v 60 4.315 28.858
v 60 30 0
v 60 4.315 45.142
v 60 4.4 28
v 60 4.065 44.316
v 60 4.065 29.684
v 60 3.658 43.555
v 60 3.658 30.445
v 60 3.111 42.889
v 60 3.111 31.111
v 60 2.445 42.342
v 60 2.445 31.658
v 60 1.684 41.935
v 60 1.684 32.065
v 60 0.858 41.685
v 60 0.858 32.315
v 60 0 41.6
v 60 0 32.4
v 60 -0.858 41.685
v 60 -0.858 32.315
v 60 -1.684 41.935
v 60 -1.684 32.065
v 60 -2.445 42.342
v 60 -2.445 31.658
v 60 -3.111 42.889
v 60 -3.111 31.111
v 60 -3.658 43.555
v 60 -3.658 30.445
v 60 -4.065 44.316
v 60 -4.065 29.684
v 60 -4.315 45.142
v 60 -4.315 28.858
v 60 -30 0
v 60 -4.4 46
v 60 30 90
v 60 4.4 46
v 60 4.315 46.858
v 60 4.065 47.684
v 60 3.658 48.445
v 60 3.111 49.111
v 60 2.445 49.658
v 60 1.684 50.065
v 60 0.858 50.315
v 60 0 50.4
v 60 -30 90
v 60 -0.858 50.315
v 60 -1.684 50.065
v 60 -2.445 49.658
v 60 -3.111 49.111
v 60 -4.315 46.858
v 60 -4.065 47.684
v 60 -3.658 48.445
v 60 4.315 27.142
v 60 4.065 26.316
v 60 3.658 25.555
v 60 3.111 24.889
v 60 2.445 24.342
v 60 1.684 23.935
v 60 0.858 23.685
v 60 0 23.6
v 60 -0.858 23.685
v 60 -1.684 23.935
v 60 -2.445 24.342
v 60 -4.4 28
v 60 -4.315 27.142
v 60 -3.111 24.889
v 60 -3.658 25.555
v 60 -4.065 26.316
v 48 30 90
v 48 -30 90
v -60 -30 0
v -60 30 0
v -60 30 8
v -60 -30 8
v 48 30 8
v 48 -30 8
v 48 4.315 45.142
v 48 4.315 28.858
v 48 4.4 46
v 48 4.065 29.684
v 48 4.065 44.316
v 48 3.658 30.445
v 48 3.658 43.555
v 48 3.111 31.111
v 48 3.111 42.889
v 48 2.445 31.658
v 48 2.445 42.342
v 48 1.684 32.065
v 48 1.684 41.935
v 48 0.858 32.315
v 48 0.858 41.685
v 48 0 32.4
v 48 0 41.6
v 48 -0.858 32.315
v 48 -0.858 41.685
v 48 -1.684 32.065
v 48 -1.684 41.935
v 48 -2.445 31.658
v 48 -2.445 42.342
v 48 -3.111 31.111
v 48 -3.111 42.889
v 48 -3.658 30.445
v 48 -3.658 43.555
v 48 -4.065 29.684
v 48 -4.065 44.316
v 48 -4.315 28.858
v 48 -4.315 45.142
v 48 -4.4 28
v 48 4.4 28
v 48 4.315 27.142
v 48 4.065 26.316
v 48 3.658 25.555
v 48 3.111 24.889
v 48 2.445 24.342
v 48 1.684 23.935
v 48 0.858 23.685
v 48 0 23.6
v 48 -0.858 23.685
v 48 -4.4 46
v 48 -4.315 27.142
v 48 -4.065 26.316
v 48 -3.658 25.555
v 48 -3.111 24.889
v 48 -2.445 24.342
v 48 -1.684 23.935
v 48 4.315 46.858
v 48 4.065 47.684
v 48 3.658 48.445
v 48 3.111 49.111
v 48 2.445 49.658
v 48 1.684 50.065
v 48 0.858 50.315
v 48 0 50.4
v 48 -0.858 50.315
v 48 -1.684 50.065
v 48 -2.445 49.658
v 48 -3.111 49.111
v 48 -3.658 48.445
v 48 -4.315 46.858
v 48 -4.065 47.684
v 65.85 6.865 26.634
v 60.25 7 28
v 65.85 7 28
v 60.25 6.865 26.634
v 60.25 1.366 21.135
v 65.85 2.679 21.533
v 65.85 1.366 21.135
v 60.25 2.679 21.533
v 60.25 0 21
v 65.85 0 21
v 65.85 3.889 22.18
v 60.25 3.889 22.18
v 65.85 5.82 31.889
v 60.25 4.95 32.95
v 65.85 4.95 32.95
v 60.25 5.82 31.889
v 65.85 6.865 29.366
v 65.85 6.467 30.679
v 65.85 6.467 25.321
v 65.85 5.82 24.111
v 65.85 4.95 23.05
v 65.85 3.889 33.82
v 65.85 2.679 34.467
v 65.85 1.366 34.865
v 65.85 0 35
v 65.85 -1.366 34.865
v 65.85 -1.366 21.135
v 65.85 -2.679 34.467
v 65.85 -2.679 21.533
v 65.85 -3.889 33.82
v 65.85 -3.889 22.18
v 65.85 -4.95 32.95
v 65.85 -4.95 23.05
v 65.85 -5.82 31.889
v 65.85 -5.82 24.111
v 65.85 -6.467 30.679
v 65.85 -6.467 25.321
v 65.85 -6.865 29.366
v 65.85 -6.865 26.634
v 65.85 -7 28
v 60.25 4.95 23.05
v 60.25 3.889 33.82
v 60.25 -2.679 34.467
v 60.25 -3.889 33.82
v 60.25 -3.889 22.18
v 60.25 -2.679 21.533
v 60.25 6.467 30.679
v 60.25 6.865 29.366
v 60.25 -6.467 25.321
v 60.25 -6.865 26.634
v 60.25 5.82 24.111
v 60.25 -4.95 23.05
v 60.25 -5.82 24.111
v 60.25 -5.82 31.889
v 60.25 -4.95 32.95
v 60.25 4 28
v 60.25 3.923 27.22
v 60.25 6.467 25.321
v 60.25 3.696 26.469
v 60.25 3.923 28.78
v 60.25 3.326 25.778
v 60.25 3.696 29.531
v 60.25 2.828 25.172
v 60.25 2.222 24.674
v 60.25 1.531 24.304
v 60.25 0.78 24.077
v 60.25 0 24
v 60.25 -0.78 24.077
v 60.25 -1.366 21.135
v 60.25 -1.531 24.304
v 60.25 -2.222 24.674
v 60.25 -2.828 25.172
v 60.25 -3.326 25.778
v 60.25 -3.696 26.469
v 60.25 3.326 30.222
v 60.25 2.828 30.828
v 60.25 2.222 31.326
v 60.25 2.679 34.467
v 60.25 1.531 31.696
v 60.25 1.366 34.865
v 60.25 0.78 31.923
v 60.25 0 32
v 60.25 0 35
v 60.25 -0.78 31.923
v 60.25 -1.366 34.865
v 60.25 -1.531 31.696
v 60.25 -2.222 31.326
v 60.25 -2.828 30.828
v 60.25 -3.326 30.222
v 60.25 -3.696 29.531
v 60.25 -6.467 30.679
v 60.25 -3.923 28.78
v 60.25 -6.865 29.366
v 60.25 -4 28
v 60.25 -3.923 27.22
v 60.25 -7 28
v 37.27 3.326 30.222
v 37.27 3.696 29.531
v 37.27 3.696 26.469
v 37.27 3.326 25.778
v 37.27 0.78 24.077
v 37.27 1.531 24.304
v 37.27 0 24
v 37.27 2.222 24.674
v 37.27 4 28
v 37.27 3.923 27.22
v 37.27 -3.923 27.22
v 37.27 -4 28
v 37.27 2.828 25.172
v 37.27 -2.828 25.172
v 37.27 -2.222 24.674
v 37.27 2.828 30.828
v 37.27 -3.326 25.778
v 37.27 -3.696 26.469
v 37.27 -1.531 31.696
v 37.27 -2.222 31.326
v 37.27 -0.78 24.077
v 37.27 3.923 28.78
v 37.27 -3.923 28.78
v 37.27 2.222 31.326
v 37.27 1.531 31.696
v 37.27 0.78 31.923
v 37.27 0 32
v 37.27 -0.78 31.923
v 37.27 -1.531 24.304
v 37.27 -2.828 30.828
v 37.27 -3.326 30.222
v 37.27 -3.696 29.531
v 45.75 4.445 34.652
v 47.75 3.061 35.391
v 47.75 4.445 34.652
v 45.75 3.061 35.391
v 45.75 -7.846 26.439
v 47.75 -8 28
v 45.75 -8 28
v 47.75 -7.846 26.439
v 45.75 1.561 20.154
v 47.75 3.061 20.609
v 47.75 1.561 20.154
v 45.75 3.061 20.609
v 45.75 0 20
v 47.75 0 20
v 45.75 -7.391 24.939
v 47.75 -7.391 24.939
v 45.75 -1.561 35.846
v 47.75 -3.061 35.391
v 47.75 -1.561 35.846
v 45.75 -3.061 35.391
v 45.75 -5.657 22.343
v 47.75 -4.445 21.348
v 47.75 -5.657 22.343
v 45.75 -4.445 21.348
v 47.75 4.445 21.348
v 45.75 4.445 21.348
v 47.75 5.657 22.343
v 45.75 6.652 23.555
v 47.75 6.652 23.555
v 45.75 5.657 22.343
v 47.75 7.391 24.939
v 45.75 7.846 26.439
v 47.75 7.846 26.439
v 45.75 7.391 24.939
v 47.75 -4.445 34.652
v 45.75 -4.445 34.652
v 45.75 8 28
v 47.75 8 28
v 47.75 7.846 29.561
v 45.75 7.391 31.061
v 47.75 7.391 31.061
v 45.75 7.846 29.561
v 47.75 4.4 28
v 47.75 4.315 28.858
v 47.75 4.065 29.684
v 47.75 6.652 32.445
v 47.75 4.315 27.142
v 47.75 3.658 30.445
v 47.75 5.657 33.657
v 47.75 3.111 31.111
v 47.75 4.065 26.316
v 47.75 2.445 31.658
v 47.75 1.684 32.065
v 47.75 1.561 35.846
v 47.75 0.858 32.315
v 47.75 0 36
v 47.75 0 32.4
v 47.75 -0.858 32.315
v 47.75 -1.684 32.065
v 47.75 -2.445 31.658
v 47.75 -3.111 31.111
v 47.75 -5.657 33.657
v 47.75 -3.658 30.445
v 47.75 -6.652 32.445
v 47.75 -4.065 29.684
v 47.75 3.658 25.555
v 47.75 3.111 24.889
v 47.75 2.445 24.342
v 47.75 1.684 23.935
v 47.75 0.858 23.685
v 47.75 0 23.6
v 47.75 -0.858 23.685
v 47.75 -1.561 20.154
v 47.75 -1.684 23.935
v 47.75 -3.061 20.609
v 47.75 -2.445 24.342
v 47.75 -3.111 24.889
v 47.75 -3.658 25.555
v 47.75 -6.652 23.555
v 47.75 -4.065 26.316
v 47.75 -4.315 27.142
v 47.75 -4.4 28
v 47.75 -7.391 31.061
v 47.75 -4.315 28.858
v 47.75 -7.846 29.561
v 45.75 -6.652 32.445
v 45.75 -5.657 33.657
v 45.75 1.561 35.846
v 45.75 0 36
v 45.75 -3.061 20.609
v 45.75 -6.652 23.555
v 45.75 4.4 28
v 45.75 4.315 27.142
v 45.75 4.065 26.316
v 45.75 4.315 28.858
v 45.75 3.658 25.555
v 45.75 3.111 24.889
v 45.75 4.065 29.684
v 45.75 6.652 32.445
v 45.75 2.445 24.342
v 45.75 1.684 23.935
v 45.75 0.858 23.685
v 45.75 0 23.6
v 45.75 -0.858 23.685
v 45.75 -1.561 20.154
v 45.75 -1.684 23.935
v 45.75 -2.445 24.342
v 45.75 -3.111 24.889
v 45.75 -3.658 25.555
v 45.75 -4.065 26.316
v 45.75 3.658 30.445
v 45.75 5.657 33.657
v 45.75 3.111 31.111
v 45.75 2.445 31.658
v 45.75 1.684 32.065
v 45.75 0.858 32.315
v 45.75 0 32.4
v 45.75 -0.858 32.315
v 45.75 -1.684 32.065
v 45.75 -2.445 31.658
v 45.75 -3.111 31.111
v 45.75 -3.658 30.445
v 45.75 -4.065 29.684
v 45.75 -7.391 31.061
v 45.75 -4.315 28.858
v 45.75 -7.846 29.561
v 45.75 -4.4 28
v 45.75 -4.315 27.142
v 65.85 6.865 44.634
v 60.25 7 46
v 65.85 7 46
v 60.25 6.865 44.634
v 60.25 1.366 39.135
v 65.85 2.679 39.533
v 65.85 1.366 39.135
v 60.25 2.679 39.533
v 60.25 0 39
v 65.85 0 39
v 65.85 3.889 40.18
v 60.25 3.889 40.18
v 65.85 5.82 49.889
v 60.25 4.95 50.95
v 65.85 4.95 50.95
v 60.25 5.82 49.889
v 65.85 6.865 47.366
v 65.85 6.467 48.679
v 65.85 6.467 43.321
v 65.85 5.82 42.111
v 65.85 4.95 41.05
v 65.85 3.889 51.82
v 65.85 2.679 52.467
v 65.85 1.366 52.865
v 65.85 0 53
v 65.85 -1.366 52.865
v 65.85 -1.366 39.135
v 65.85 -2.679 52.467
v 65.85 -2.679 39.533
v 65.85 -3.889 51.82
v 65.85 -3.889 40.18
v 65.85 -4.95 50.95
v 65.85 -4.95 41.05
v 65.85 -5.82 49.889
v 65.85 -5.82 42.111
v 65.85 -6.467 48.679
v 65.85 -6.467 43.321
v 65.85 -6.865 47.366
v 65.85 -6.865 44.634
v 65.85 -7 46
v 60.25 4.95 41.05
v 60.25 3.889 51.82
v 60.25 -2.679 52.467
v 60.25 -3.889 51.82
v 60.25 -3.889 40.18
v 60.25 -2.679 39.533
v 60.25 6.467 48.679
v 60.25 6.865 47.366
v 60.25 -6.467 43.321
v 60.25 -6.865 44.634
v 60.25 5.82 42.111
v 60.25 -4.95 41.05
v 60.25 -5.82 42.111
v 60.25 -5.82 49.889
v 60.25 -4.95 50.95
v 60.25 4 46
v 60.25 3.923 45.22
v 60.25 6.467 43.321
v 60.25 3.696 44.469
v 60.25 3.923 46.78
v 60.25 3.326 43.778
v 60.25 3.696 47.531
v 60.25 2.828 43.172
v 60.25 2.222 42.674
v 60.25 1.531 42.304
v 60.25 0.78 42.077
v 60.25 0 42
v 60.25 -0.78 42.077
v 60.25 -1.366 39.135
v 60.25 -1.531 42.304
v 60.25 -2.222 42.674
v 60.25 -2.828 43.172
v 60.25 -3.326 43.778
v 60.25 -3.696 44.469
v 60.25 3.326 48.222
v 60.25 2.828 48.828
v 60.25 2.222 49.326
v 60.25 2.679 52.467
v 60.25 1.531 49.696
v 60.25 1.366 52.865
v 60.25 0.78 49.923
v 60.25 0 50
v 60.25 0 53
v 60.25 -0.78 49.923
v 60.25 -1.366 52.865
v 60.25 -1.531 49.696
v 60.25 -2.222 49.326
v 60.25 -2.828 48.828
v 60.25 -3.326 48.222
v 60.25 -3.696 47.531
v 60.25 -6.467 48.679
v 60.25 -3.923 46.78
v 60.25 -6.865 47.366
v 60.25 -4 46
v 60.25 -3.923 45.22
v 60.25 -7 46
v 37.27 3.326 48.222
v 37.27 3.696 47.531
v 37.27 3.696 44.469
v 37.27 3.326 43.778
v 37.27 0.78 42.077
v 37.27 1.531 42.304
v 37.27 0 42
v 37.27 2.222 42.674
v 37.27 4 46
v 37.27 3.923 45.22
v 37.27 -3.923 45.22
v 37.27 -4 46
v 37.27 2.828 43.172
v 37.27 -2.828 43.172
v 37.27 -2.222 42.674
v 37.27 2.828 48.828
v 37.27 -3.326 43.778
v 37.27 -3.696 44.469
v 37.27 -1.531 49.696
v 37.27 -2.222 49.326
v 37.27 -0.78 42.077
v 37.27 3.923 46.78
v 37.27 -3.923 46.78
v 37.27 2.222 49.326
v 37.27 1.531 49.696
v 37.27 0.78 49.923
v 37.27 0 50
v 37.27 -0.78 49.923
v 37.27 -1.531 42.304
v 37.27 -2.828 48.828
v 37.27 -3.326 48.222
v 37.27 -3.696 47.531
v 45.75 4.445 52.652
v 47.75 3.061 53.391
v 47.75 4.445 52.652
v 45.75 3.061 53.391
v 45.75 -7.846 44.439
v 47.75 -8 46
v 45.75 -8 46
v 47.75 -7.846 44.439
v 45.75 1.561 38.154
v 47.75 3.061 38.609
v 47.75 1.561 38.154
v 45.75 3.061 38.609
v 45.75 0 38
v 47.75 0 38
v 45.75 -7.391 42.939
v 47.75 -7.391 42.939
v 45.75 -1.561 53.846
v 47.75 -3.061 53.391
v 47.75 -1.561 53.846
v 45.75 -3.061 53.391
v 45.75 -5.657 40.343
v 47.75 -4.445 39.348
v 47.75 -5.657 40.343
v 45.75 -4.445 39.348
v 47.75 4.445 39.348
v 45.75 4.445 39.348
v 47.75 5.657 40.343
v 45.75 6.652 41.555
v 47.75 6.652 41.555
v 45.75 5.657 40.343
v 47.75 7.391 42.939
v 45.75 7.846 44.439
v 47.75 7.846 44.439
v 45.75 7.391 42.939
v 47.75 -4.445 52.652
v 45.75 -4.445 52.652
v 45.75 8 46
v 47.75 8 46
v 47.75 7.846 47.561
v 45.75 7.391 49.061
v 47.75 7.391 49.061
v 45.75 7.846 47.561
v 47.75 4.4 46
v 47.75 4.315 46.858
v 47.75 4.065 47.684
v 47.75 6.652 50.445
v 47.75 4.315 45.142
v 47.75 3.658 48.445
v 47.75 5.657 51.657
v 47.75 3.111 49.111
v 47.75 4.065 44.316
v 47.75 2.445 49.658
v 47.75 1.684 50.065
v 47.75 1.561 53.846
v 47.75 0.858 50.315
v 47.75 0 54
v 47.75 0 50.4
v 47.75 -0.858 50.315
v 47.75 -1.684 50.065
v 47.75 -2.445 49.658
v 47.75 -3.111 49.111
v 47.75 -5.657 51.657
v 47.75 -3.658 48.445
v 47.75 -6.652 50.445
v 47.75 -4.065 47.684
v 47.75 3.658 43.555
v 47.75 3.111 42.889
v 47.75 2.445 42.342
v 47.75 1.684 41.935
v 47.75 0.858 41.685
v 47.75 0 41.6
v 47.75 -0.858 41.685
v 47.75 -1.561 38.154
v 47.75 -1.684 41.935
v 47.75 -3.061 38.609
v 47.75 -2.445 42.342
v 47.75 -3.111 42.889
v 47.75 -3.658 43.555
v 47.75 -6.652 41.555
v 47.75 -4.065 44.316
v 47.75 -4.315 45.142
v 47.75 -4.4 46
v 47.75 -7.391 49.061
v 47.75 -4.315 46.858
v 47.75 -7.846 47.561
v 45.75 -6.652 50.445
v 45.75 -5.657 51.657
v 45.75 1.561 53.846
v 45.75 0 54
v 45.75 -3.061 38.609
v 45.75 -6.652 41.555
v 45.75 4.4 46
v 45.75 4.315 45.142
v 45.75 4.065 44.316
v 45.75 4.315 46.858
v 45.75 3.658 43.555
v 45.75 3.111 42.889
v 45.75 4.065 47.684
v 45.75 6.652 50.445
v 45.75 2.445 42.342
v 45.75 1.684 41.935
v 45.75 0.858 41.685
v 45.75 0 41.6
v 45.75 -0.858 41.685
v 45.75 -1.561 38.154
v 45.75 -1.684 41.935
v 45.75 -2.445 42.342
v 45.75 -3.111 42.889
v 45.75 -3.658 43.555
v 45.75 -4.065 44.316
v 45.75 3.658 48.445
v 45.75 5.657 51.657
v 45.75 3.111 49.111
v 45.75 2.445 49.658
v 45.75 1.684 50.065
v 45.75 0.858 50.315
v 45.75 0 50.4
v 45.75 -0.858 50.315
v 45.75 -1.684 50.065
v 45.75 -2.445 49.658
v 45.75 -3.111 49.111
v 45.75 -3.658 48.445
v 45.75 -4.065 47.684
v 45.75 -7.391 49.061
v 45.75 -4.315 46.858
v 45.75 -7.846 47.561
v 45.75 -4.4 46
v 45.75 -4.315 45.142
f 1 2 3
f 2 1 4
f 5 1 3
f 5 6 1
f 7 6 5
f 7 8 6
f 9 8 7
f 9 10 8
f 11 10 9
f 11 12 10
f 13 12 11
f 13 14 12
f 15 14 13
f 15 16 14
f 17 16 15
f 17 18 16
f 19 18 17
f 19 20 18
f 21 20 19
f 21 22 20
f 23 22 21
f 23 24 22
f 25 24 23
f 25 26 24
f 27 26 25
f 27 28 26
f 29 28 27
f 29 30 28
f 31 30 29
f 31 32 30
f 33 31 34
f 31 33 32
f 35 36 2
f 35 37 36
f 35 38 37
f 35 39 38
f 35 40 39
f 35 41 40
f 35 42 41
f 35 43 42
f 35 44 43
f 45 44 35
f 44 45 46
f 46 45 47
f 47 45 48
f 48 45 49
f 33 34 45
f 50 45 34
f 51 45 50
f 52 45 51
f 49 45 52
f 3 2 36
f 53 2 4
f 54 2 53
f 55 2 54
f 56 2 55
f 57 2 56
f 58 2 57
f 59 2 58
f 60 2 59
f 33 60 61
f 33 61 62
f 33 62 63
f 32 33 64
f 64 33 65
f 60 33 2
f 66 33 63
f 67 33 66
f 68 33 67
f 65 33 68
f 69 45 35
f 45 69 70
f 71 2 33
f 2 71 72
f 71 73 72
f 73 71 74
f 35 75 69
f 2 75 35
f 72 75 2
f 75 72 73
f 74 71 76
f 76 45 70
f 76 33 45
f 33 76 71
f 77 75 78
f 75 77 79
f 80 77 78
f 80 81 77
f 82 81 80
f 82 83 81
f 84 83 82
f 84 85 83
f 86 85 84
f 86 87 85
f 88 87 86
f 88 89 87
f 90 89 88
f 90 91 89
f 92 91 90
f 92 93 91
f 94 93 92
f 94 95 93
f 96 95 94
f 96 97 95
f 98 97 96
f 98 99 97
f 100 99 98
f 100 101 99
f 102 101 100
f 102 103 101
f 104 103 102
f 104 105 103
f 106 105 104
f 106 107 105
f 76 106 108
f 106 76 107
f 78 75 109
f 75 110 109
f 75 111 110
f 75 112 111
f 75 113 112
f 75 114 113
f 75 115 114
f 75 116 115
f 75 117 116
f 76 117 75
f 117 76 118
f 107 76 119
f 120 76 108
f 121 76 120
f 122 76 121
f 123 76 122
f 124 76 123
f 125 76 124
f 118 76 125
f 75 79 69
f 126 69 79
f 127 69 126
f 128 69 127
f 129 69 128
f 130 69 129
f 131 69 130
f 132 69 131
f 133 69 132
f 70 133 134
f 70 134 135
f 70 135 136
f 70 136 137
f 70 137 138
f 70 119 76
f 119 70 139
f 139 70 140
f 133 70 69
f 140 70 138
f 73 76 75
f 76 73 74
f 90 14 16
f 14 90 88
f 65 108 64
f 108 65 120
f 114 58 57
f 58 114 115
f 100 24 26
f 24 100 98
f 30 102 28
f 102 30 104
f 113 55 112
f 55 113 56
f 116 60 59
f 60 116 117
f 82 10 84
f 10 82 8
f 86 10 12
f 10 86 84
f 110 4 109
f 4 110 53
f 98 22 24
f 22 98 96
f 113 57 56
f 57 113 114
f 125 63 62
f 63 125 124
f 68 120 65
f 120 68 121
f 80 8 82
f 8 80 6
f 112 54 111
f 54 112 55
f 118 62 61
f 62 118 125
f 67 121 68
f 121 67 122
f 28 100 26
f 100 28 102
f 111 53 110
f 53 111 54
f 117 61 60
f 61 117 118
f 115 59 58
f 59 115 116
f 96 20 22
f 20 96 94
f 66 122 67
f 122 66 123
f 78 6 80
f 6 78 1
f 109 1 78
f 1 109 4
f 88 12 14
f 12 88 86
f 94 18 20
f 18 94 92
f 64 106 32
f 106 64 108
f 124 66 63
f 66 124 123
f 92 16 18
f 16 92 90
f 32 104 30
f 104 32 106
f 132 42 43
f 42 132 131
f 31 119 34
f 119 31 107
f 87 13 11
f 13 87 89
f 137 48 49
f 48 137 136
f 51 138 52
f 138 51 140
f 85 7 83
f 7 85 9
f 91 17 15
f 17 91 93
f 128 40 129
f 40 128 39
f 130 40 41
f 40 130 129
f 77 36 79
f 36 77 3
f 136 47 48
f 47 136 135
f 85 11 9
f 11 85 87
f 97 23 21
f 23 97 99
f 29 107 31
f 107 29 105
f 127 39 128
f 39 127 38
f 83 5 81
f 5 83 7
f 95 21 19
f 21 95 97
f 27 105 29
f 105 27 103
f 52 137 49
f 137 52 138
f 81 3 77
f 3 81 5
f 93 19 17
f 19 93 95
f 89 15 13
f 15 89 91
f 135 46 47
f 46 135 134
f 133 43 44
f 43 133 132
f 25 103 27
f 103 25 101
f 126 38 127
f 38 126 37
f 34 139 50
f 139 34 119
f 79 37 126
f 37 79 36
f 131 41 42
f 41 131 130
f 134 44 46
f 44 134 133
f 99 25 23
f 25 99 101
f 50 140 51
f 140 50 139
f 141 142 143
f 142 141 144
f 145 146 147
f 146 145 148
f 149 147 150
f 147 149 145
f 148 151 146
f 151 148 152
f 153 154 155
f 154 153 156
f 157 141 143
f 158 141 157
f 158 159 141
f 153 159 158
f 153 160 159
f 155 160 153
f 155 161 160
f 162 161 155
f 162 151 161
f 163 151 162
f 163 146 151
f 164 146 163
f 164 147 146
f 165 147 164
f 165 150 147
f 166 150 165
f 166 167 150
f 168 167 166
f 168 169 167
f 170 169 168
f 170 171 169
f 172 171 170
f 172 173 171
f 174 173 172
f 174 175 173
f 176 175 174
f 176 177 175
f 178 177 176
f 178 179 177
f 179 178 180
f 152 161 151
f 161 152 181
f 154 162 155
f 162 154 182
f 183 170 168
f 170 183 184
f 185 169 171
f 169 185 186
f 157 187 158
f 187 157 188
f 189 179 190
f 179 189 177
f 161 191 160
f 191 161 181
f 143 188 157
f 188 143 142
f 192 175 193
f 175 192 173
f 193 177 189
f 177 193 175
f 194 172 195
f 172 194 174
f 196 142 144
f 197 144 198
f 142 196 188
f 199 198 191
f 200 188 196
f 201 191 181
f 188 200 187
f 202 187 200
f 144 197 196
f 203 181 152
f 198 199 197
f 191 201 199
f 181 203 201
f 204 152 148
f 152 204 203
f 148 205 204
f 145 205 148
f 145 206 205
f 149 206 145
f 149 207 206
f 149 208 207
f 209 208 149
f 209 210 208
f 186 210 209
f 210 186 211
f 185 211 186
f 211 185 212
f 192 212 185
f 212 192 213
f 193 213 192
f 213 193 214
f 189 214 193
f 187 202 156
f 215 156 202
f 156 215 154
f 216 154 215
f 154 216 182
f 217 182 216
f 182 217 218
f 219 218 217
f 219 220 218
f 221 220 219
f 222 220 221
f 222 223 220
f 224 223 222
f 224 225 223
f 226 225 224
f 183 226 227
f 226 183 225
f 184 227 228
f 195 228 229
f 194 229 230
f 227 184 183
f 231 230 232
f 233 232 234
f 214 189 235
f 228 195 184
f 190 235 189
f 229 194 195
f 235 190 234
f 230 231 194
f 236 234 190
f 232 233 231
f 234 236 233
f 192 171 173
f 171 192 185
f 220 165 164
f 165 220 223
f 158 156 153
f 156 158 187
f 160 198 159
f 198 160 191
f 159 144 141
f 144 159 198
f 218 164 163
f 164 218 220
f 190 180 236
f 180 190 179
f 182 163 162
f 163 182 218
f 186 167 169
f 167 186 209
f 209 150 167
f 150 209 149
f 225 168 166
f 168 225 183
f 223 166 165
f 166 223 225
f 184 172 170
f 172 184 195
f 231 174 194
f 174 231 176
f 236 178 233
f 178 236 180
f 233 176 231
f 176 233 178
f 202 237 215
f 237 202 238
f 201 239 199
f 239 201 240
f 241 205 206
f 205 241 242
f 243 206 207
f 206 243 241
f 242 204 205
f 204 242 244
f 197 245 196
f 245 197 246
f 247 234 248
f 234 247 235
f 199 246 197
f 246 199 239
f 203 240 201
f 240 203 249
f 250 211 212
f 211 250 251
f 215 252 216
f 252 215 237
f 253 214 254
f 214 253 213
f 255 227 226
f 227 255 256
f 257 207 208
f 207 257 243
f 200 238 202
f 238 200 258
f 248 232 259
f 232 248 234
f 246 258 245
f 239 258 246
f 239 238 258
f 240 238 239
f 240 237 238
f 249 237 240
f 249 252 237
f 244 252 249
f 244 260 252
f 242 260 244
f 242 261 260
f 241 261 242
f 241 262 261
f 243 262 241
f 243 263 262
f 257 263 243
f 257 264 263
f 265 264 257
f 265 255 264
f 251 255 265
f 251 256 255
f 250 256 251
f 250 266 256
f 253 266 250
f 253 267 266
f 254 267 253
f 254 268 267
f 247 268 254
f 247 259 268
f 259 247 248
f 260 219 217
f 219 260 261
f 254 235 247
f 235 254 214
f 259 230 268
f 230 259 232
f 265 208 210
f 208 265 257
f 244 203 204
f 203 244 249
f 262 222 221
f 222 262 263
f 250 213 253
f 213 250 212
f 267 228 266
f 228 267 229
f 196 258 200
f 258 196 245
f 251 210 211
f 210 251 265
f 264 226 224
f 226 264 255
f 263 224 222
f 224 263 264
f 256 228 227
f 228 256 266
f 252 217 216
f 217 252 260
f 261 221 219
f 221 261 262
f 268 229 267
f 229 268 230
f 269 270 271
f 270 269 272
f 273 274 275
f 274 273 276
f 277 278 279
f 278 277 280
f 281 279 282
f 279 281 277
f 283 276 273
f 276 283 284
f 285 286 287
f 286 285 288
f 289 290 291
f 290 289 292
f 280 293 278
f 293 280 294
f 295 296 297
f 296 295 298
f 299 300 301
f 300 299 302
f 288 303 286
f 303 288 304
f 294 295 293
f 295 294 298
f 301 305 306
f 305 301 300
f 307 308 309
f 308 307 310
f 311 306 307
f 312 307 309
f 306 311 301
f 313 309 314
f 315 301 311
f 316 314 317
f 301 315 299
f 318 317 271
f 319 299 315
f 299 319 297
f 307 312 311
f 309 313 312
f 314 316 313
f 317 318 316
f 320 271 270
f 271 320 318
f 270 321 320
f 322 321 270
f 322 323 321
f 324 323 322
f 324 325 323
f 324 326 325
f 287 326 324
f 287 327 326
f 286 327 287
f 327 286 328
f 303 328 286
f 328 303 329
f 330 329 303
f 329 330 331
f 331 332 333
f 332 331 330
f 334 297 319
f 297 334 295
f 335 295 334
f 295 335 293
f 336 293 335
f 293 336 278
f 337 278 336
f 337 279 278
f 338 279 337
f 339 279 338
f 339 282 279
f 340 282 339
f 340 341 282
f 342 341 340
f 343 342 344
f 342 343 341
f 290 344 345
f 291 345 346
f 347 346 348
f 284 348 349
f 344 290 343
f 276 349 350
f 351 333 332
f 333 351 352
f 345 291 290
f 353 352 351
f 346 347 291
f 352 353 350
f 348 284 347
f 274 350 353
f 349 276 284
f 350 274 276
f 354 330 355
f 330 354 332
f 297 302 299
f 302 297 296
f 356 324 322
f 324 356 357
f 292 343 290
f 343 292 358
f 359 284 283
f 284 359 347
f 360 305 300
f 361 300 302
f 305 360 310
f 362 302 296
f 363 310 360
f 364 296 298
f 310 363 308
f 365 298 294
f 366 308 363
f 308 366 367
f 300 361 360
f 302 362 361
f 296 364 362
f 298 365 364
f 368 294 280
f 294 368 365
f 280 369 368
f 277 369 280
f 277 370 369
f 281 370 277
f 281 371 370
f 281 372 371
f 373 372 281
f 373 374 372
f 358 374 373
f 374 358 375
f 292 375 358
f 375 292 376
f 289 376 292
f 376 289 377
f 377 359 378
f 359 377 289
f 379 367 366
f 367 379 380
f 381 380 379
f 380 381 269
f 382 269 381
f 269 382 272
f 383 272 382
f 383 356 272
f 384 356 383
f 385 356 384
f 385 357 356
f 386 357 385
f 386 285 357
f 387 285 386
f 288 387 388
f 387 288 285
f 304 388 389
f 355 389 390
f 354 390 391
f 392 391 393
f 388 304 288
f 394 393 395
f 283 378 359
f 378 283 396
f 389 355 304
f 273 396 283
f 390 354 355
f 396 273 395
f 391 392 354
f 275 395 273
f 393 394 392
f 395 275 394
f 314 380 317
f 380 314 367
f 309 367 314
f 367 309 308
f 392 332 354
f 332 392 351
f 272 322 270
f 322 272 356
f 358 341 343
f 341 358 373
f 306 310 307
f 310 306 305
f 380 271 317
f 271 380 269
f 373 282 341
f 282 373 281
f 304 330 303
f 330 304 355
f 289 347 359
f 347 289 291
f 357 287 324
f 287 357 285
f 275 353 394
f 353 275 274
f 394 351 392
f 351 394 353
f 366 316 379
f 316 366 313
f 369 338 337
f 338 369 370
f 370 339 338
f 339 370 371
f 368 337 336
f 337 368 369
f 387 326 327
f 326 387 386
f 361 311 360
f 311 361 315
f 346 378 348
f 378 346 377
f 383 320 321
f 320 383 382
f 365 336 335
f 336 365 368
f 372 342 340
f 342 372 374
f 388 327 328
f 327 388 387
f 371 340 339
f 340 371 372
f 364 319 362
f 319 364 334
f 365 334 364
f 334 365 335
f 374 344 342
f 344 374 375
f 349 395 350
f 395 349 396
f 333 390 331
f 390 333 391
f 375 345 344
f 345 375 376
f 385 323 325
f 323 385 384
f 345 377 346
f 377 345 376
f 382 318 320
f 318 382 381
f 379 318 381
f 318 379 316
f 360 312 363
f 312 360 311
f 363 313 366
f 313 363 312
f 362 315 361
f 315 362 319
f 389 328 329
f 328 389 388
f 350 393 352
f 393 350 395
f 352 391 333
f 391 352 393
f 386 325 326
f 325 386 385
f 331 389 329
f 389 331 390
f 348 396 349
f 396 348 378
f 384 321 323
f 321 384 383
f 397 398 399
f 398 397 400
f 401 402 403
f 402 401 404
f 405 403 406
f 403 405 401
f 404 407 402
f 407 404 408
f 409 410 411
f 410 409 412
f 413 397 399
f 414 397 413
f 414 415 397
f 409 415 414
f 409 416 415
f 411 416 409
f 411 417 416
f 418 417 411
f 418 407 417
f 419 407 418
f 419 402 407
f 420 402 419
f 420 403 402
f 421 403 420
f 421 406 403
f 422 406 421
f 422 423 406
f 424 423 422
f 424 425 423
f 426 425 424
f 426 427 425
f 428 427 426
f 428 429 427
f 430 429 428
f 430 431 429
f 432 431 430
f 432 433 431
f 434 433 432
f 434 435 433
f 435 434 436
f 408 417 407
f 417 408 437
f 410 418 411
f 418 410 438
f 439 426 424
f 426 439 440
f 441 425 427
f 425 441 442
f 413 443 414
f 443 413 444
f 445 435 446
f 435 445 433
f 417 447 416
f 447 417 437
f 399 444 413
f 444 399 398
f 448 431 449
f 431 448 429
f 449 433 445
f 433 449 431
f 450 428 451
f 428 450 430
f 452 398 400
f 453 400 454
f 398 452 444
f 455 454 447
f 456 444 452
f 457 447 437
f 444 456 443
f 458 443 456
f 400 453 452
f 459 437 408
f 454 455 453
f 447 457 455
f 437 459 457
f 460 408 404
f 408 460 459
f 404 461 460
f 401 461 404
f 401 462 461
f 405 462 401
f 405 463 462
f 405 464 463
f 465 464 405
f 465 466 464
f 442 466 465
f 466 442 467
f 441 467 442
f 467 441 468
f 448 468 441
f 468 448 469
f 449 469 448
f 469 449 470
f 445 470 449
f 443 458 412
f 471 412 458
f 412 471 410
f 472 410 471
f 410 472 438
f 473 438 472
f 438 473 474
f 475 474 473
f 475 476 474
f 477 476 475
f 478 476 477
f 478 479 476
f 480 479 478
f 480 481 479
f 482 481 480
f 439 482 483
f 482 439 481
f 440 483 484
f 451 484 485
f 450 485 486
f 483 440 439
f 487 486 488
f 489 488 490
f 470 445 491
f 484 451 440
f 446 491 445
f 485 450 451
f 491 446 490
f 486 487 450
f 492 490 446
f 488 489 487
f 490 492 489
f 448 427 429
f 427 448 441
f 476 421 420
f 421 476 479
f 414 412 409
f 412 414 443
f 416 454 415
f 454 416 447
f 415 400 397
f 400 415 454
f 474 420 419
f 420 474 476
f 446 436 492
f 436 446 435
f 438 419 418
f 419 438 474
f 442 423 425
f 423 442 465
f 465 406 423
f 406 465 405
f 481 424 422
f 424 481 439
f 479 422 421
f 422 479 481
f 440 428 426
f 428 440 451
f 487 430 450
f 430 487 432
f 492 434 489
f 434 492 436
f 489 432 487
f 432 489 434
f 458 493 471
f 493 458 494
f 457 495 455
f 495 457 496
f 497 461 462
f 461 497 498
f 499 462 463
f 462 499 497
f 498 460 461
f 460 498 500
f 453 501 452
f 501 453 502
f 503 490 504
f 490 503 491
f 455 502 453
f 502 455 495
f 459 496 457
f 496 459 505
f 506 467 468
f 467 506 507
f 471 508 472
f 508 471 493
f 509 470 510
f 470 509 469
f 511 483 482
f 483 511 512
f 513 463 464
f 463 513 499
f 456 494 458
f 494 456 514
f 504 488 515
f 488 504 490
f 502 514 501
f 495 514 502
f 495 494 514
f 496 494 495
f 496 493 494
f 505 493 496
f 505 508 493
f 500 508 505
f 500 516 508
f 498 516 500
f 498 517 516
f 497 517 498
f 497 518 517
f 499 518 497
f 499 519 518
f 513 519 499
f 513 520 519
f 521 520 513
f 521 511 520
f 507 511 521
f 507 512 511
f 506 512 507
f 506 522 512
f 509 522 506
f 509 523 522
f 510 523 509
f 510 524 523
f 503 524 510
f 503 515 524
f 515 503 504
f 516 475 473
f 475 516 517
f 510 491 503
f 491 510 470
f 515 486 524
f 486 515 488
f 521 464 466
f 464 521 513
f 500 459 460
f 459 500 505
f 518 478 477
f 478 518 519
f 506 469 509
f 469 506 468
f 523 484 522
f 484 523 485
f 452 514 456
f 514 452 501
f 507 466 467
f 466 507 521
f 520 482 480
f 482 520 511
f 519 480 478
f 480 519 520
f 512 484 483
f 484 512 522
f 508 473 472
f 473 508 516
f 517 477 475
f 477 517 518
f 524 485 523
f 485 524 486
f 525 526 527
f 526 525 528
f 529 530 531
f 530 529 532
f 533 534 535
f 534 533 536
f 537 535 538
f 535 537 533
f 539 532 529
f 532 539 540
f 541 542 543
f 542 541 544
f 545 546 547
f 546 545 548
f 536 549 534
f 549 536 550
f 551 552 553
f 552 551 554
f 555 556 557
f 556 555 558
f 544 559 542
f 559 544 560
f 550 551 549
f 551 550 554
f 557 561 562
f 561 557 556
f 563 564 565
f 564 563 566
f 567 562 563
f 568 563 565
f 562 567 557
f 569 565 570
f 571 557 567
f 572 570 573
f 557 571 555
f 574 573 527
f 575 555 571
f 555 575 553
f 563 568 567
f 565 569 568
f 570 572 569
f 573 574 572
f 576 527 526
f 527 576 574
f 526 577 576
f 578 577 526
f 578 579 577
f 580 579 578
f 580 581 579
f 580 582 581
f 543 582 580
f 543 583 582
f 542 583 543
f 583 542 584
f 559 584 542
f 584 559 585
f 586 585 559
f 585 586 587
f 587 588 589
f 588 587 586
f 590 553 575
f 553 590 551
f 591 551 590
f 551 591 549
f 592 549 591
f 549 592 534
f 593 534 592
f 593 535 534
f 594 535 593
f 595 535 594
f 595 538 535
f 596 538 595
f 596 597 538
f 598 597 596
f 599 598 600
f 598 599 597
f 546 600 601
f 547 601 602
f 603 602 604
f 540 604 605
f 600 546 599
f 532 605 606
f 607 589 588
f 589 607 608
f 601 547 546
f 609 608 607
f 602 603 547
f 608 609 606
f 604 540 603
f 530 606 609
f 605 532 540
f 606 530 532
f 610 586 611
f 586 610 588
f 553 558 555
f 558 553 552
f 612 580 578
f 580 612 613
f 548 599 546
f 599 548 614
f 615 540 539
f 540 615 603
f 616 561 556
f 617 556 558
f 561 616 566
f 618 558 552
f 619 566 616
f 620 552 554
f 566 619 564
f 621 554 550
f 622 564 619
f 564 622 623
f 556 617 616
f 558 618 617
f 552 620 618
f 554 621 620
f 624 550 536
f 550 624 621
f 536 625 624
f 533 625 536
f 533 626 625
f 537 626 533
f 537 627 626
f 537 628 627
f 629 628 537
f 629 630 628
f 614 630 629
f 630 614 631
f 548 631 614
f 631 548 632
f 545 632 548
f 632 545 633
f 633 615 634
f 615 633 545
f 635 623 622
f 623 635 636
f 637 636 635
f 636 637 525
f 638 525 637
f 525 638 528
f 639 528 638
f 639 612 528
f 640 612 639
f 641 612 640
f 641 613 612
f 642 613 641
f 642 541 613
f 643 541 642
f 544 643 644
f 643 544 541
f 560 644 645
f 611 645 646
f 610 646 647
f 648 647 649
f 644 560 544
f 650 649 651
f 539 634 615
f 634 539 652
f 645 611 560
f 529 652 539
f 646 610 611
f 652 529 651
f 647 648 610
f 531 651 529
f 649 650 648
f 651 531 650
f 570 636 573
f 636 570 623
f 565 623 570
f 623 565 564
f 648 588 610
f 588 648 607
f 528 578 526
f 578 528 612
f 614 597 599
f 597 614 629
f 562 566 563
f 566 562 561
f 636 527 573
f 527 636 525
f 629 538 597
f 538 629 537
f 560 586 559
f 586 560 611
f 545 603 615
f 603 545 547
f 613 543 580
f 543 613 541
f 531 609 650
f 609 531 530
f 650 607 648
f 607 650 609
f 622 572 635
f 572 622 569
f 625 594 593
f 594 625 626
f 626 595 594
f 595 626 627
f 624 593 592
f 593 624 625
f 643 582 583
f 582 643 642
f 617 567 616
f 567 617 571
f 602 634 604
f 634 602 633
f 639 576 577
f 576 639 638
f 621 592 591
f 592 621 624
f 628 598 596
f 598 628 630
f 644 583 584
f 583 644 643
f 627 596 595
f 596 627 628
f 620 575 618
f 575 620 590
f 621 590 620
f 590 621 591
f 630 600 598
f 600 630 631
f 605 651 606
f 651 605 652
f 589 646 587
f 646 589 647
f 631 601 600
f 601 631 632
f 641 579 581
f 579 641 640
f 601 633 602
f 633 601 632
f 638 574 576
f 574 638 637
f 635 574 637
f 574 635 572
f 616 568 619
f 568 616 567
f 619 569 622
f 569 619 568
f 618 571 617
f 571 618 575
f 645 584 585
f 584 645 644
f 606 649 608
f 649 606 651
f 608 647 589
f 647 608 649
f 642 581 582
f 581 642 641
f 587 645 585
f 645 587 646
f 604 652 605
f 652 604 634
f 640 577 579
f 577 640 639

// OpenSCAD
$fn = 32;

// ------------------------------------------------------------------------
// Bolted bracket: 120 x 60 mm bracket with 2 bolt joints
// Every part is its own module, assembly() places them once.
// ------------------------------------------------------------------------

// --- part 1 ---
module bracket() {
  difference() {
    translate([-60, -30, 0]) cube([120, 60, 90]);
    translate([-61, -31, 8]) cube([109, 62, 83]);
    translate([54, 0, 28]) rotate([0, 90, 0]) cylinder(h = 14, d = 8.8, center = true);
    translate([54, 0, 46]) rotate([0, 90, 0]) cylinder(h = 14, d = 8.8, center = true);
  }
}

// --- part 2 ---
module bolt1() {
  cylinder(h = 5.6, d = 14);
  translate([0, 0, -22.98]) cylinder(h = 22.98, d = 8);
}

// --- part 3 ---
module washer1() {
  difference() {
      translate([0, 0, 0]) cylinder(h = 2, d = 16);
      translate([0, 0, -1]) cylinder(h = 4, d = 8.8);
    }
}

// --- part 4 ---
module bolt2() {
  cylinder(h = 5.6, d = 14);
  translate([0, 0, -22.98]) cylinder(h = 22.98, d = 8);
}

// --- part 5 ---
module washer2() {
  difference() {
      translate([0, 0, 0]) cylinder(h = 2, d = 16);
      translate([0, 0, -1]) cylinder(h = 4, d = 8.8);
    }
}

// --- assembly ---
module assembly() {
  translate([0, 0, 0]) rotate([0, 0, 0]) bracket();
  translate([60.25, 0, 28]) rotate([0, 90, 0]) bolt1();
  translate([45.75, 0, 28]) rotate([0, 90, 0]) washer1();
  translate([60.25, 0, 46]) rotate([0, 90, 0]) bolt2();
  translate([45.75, 0, 46]) rotate([0, 90, 0]) washer2();
}

assembly();
